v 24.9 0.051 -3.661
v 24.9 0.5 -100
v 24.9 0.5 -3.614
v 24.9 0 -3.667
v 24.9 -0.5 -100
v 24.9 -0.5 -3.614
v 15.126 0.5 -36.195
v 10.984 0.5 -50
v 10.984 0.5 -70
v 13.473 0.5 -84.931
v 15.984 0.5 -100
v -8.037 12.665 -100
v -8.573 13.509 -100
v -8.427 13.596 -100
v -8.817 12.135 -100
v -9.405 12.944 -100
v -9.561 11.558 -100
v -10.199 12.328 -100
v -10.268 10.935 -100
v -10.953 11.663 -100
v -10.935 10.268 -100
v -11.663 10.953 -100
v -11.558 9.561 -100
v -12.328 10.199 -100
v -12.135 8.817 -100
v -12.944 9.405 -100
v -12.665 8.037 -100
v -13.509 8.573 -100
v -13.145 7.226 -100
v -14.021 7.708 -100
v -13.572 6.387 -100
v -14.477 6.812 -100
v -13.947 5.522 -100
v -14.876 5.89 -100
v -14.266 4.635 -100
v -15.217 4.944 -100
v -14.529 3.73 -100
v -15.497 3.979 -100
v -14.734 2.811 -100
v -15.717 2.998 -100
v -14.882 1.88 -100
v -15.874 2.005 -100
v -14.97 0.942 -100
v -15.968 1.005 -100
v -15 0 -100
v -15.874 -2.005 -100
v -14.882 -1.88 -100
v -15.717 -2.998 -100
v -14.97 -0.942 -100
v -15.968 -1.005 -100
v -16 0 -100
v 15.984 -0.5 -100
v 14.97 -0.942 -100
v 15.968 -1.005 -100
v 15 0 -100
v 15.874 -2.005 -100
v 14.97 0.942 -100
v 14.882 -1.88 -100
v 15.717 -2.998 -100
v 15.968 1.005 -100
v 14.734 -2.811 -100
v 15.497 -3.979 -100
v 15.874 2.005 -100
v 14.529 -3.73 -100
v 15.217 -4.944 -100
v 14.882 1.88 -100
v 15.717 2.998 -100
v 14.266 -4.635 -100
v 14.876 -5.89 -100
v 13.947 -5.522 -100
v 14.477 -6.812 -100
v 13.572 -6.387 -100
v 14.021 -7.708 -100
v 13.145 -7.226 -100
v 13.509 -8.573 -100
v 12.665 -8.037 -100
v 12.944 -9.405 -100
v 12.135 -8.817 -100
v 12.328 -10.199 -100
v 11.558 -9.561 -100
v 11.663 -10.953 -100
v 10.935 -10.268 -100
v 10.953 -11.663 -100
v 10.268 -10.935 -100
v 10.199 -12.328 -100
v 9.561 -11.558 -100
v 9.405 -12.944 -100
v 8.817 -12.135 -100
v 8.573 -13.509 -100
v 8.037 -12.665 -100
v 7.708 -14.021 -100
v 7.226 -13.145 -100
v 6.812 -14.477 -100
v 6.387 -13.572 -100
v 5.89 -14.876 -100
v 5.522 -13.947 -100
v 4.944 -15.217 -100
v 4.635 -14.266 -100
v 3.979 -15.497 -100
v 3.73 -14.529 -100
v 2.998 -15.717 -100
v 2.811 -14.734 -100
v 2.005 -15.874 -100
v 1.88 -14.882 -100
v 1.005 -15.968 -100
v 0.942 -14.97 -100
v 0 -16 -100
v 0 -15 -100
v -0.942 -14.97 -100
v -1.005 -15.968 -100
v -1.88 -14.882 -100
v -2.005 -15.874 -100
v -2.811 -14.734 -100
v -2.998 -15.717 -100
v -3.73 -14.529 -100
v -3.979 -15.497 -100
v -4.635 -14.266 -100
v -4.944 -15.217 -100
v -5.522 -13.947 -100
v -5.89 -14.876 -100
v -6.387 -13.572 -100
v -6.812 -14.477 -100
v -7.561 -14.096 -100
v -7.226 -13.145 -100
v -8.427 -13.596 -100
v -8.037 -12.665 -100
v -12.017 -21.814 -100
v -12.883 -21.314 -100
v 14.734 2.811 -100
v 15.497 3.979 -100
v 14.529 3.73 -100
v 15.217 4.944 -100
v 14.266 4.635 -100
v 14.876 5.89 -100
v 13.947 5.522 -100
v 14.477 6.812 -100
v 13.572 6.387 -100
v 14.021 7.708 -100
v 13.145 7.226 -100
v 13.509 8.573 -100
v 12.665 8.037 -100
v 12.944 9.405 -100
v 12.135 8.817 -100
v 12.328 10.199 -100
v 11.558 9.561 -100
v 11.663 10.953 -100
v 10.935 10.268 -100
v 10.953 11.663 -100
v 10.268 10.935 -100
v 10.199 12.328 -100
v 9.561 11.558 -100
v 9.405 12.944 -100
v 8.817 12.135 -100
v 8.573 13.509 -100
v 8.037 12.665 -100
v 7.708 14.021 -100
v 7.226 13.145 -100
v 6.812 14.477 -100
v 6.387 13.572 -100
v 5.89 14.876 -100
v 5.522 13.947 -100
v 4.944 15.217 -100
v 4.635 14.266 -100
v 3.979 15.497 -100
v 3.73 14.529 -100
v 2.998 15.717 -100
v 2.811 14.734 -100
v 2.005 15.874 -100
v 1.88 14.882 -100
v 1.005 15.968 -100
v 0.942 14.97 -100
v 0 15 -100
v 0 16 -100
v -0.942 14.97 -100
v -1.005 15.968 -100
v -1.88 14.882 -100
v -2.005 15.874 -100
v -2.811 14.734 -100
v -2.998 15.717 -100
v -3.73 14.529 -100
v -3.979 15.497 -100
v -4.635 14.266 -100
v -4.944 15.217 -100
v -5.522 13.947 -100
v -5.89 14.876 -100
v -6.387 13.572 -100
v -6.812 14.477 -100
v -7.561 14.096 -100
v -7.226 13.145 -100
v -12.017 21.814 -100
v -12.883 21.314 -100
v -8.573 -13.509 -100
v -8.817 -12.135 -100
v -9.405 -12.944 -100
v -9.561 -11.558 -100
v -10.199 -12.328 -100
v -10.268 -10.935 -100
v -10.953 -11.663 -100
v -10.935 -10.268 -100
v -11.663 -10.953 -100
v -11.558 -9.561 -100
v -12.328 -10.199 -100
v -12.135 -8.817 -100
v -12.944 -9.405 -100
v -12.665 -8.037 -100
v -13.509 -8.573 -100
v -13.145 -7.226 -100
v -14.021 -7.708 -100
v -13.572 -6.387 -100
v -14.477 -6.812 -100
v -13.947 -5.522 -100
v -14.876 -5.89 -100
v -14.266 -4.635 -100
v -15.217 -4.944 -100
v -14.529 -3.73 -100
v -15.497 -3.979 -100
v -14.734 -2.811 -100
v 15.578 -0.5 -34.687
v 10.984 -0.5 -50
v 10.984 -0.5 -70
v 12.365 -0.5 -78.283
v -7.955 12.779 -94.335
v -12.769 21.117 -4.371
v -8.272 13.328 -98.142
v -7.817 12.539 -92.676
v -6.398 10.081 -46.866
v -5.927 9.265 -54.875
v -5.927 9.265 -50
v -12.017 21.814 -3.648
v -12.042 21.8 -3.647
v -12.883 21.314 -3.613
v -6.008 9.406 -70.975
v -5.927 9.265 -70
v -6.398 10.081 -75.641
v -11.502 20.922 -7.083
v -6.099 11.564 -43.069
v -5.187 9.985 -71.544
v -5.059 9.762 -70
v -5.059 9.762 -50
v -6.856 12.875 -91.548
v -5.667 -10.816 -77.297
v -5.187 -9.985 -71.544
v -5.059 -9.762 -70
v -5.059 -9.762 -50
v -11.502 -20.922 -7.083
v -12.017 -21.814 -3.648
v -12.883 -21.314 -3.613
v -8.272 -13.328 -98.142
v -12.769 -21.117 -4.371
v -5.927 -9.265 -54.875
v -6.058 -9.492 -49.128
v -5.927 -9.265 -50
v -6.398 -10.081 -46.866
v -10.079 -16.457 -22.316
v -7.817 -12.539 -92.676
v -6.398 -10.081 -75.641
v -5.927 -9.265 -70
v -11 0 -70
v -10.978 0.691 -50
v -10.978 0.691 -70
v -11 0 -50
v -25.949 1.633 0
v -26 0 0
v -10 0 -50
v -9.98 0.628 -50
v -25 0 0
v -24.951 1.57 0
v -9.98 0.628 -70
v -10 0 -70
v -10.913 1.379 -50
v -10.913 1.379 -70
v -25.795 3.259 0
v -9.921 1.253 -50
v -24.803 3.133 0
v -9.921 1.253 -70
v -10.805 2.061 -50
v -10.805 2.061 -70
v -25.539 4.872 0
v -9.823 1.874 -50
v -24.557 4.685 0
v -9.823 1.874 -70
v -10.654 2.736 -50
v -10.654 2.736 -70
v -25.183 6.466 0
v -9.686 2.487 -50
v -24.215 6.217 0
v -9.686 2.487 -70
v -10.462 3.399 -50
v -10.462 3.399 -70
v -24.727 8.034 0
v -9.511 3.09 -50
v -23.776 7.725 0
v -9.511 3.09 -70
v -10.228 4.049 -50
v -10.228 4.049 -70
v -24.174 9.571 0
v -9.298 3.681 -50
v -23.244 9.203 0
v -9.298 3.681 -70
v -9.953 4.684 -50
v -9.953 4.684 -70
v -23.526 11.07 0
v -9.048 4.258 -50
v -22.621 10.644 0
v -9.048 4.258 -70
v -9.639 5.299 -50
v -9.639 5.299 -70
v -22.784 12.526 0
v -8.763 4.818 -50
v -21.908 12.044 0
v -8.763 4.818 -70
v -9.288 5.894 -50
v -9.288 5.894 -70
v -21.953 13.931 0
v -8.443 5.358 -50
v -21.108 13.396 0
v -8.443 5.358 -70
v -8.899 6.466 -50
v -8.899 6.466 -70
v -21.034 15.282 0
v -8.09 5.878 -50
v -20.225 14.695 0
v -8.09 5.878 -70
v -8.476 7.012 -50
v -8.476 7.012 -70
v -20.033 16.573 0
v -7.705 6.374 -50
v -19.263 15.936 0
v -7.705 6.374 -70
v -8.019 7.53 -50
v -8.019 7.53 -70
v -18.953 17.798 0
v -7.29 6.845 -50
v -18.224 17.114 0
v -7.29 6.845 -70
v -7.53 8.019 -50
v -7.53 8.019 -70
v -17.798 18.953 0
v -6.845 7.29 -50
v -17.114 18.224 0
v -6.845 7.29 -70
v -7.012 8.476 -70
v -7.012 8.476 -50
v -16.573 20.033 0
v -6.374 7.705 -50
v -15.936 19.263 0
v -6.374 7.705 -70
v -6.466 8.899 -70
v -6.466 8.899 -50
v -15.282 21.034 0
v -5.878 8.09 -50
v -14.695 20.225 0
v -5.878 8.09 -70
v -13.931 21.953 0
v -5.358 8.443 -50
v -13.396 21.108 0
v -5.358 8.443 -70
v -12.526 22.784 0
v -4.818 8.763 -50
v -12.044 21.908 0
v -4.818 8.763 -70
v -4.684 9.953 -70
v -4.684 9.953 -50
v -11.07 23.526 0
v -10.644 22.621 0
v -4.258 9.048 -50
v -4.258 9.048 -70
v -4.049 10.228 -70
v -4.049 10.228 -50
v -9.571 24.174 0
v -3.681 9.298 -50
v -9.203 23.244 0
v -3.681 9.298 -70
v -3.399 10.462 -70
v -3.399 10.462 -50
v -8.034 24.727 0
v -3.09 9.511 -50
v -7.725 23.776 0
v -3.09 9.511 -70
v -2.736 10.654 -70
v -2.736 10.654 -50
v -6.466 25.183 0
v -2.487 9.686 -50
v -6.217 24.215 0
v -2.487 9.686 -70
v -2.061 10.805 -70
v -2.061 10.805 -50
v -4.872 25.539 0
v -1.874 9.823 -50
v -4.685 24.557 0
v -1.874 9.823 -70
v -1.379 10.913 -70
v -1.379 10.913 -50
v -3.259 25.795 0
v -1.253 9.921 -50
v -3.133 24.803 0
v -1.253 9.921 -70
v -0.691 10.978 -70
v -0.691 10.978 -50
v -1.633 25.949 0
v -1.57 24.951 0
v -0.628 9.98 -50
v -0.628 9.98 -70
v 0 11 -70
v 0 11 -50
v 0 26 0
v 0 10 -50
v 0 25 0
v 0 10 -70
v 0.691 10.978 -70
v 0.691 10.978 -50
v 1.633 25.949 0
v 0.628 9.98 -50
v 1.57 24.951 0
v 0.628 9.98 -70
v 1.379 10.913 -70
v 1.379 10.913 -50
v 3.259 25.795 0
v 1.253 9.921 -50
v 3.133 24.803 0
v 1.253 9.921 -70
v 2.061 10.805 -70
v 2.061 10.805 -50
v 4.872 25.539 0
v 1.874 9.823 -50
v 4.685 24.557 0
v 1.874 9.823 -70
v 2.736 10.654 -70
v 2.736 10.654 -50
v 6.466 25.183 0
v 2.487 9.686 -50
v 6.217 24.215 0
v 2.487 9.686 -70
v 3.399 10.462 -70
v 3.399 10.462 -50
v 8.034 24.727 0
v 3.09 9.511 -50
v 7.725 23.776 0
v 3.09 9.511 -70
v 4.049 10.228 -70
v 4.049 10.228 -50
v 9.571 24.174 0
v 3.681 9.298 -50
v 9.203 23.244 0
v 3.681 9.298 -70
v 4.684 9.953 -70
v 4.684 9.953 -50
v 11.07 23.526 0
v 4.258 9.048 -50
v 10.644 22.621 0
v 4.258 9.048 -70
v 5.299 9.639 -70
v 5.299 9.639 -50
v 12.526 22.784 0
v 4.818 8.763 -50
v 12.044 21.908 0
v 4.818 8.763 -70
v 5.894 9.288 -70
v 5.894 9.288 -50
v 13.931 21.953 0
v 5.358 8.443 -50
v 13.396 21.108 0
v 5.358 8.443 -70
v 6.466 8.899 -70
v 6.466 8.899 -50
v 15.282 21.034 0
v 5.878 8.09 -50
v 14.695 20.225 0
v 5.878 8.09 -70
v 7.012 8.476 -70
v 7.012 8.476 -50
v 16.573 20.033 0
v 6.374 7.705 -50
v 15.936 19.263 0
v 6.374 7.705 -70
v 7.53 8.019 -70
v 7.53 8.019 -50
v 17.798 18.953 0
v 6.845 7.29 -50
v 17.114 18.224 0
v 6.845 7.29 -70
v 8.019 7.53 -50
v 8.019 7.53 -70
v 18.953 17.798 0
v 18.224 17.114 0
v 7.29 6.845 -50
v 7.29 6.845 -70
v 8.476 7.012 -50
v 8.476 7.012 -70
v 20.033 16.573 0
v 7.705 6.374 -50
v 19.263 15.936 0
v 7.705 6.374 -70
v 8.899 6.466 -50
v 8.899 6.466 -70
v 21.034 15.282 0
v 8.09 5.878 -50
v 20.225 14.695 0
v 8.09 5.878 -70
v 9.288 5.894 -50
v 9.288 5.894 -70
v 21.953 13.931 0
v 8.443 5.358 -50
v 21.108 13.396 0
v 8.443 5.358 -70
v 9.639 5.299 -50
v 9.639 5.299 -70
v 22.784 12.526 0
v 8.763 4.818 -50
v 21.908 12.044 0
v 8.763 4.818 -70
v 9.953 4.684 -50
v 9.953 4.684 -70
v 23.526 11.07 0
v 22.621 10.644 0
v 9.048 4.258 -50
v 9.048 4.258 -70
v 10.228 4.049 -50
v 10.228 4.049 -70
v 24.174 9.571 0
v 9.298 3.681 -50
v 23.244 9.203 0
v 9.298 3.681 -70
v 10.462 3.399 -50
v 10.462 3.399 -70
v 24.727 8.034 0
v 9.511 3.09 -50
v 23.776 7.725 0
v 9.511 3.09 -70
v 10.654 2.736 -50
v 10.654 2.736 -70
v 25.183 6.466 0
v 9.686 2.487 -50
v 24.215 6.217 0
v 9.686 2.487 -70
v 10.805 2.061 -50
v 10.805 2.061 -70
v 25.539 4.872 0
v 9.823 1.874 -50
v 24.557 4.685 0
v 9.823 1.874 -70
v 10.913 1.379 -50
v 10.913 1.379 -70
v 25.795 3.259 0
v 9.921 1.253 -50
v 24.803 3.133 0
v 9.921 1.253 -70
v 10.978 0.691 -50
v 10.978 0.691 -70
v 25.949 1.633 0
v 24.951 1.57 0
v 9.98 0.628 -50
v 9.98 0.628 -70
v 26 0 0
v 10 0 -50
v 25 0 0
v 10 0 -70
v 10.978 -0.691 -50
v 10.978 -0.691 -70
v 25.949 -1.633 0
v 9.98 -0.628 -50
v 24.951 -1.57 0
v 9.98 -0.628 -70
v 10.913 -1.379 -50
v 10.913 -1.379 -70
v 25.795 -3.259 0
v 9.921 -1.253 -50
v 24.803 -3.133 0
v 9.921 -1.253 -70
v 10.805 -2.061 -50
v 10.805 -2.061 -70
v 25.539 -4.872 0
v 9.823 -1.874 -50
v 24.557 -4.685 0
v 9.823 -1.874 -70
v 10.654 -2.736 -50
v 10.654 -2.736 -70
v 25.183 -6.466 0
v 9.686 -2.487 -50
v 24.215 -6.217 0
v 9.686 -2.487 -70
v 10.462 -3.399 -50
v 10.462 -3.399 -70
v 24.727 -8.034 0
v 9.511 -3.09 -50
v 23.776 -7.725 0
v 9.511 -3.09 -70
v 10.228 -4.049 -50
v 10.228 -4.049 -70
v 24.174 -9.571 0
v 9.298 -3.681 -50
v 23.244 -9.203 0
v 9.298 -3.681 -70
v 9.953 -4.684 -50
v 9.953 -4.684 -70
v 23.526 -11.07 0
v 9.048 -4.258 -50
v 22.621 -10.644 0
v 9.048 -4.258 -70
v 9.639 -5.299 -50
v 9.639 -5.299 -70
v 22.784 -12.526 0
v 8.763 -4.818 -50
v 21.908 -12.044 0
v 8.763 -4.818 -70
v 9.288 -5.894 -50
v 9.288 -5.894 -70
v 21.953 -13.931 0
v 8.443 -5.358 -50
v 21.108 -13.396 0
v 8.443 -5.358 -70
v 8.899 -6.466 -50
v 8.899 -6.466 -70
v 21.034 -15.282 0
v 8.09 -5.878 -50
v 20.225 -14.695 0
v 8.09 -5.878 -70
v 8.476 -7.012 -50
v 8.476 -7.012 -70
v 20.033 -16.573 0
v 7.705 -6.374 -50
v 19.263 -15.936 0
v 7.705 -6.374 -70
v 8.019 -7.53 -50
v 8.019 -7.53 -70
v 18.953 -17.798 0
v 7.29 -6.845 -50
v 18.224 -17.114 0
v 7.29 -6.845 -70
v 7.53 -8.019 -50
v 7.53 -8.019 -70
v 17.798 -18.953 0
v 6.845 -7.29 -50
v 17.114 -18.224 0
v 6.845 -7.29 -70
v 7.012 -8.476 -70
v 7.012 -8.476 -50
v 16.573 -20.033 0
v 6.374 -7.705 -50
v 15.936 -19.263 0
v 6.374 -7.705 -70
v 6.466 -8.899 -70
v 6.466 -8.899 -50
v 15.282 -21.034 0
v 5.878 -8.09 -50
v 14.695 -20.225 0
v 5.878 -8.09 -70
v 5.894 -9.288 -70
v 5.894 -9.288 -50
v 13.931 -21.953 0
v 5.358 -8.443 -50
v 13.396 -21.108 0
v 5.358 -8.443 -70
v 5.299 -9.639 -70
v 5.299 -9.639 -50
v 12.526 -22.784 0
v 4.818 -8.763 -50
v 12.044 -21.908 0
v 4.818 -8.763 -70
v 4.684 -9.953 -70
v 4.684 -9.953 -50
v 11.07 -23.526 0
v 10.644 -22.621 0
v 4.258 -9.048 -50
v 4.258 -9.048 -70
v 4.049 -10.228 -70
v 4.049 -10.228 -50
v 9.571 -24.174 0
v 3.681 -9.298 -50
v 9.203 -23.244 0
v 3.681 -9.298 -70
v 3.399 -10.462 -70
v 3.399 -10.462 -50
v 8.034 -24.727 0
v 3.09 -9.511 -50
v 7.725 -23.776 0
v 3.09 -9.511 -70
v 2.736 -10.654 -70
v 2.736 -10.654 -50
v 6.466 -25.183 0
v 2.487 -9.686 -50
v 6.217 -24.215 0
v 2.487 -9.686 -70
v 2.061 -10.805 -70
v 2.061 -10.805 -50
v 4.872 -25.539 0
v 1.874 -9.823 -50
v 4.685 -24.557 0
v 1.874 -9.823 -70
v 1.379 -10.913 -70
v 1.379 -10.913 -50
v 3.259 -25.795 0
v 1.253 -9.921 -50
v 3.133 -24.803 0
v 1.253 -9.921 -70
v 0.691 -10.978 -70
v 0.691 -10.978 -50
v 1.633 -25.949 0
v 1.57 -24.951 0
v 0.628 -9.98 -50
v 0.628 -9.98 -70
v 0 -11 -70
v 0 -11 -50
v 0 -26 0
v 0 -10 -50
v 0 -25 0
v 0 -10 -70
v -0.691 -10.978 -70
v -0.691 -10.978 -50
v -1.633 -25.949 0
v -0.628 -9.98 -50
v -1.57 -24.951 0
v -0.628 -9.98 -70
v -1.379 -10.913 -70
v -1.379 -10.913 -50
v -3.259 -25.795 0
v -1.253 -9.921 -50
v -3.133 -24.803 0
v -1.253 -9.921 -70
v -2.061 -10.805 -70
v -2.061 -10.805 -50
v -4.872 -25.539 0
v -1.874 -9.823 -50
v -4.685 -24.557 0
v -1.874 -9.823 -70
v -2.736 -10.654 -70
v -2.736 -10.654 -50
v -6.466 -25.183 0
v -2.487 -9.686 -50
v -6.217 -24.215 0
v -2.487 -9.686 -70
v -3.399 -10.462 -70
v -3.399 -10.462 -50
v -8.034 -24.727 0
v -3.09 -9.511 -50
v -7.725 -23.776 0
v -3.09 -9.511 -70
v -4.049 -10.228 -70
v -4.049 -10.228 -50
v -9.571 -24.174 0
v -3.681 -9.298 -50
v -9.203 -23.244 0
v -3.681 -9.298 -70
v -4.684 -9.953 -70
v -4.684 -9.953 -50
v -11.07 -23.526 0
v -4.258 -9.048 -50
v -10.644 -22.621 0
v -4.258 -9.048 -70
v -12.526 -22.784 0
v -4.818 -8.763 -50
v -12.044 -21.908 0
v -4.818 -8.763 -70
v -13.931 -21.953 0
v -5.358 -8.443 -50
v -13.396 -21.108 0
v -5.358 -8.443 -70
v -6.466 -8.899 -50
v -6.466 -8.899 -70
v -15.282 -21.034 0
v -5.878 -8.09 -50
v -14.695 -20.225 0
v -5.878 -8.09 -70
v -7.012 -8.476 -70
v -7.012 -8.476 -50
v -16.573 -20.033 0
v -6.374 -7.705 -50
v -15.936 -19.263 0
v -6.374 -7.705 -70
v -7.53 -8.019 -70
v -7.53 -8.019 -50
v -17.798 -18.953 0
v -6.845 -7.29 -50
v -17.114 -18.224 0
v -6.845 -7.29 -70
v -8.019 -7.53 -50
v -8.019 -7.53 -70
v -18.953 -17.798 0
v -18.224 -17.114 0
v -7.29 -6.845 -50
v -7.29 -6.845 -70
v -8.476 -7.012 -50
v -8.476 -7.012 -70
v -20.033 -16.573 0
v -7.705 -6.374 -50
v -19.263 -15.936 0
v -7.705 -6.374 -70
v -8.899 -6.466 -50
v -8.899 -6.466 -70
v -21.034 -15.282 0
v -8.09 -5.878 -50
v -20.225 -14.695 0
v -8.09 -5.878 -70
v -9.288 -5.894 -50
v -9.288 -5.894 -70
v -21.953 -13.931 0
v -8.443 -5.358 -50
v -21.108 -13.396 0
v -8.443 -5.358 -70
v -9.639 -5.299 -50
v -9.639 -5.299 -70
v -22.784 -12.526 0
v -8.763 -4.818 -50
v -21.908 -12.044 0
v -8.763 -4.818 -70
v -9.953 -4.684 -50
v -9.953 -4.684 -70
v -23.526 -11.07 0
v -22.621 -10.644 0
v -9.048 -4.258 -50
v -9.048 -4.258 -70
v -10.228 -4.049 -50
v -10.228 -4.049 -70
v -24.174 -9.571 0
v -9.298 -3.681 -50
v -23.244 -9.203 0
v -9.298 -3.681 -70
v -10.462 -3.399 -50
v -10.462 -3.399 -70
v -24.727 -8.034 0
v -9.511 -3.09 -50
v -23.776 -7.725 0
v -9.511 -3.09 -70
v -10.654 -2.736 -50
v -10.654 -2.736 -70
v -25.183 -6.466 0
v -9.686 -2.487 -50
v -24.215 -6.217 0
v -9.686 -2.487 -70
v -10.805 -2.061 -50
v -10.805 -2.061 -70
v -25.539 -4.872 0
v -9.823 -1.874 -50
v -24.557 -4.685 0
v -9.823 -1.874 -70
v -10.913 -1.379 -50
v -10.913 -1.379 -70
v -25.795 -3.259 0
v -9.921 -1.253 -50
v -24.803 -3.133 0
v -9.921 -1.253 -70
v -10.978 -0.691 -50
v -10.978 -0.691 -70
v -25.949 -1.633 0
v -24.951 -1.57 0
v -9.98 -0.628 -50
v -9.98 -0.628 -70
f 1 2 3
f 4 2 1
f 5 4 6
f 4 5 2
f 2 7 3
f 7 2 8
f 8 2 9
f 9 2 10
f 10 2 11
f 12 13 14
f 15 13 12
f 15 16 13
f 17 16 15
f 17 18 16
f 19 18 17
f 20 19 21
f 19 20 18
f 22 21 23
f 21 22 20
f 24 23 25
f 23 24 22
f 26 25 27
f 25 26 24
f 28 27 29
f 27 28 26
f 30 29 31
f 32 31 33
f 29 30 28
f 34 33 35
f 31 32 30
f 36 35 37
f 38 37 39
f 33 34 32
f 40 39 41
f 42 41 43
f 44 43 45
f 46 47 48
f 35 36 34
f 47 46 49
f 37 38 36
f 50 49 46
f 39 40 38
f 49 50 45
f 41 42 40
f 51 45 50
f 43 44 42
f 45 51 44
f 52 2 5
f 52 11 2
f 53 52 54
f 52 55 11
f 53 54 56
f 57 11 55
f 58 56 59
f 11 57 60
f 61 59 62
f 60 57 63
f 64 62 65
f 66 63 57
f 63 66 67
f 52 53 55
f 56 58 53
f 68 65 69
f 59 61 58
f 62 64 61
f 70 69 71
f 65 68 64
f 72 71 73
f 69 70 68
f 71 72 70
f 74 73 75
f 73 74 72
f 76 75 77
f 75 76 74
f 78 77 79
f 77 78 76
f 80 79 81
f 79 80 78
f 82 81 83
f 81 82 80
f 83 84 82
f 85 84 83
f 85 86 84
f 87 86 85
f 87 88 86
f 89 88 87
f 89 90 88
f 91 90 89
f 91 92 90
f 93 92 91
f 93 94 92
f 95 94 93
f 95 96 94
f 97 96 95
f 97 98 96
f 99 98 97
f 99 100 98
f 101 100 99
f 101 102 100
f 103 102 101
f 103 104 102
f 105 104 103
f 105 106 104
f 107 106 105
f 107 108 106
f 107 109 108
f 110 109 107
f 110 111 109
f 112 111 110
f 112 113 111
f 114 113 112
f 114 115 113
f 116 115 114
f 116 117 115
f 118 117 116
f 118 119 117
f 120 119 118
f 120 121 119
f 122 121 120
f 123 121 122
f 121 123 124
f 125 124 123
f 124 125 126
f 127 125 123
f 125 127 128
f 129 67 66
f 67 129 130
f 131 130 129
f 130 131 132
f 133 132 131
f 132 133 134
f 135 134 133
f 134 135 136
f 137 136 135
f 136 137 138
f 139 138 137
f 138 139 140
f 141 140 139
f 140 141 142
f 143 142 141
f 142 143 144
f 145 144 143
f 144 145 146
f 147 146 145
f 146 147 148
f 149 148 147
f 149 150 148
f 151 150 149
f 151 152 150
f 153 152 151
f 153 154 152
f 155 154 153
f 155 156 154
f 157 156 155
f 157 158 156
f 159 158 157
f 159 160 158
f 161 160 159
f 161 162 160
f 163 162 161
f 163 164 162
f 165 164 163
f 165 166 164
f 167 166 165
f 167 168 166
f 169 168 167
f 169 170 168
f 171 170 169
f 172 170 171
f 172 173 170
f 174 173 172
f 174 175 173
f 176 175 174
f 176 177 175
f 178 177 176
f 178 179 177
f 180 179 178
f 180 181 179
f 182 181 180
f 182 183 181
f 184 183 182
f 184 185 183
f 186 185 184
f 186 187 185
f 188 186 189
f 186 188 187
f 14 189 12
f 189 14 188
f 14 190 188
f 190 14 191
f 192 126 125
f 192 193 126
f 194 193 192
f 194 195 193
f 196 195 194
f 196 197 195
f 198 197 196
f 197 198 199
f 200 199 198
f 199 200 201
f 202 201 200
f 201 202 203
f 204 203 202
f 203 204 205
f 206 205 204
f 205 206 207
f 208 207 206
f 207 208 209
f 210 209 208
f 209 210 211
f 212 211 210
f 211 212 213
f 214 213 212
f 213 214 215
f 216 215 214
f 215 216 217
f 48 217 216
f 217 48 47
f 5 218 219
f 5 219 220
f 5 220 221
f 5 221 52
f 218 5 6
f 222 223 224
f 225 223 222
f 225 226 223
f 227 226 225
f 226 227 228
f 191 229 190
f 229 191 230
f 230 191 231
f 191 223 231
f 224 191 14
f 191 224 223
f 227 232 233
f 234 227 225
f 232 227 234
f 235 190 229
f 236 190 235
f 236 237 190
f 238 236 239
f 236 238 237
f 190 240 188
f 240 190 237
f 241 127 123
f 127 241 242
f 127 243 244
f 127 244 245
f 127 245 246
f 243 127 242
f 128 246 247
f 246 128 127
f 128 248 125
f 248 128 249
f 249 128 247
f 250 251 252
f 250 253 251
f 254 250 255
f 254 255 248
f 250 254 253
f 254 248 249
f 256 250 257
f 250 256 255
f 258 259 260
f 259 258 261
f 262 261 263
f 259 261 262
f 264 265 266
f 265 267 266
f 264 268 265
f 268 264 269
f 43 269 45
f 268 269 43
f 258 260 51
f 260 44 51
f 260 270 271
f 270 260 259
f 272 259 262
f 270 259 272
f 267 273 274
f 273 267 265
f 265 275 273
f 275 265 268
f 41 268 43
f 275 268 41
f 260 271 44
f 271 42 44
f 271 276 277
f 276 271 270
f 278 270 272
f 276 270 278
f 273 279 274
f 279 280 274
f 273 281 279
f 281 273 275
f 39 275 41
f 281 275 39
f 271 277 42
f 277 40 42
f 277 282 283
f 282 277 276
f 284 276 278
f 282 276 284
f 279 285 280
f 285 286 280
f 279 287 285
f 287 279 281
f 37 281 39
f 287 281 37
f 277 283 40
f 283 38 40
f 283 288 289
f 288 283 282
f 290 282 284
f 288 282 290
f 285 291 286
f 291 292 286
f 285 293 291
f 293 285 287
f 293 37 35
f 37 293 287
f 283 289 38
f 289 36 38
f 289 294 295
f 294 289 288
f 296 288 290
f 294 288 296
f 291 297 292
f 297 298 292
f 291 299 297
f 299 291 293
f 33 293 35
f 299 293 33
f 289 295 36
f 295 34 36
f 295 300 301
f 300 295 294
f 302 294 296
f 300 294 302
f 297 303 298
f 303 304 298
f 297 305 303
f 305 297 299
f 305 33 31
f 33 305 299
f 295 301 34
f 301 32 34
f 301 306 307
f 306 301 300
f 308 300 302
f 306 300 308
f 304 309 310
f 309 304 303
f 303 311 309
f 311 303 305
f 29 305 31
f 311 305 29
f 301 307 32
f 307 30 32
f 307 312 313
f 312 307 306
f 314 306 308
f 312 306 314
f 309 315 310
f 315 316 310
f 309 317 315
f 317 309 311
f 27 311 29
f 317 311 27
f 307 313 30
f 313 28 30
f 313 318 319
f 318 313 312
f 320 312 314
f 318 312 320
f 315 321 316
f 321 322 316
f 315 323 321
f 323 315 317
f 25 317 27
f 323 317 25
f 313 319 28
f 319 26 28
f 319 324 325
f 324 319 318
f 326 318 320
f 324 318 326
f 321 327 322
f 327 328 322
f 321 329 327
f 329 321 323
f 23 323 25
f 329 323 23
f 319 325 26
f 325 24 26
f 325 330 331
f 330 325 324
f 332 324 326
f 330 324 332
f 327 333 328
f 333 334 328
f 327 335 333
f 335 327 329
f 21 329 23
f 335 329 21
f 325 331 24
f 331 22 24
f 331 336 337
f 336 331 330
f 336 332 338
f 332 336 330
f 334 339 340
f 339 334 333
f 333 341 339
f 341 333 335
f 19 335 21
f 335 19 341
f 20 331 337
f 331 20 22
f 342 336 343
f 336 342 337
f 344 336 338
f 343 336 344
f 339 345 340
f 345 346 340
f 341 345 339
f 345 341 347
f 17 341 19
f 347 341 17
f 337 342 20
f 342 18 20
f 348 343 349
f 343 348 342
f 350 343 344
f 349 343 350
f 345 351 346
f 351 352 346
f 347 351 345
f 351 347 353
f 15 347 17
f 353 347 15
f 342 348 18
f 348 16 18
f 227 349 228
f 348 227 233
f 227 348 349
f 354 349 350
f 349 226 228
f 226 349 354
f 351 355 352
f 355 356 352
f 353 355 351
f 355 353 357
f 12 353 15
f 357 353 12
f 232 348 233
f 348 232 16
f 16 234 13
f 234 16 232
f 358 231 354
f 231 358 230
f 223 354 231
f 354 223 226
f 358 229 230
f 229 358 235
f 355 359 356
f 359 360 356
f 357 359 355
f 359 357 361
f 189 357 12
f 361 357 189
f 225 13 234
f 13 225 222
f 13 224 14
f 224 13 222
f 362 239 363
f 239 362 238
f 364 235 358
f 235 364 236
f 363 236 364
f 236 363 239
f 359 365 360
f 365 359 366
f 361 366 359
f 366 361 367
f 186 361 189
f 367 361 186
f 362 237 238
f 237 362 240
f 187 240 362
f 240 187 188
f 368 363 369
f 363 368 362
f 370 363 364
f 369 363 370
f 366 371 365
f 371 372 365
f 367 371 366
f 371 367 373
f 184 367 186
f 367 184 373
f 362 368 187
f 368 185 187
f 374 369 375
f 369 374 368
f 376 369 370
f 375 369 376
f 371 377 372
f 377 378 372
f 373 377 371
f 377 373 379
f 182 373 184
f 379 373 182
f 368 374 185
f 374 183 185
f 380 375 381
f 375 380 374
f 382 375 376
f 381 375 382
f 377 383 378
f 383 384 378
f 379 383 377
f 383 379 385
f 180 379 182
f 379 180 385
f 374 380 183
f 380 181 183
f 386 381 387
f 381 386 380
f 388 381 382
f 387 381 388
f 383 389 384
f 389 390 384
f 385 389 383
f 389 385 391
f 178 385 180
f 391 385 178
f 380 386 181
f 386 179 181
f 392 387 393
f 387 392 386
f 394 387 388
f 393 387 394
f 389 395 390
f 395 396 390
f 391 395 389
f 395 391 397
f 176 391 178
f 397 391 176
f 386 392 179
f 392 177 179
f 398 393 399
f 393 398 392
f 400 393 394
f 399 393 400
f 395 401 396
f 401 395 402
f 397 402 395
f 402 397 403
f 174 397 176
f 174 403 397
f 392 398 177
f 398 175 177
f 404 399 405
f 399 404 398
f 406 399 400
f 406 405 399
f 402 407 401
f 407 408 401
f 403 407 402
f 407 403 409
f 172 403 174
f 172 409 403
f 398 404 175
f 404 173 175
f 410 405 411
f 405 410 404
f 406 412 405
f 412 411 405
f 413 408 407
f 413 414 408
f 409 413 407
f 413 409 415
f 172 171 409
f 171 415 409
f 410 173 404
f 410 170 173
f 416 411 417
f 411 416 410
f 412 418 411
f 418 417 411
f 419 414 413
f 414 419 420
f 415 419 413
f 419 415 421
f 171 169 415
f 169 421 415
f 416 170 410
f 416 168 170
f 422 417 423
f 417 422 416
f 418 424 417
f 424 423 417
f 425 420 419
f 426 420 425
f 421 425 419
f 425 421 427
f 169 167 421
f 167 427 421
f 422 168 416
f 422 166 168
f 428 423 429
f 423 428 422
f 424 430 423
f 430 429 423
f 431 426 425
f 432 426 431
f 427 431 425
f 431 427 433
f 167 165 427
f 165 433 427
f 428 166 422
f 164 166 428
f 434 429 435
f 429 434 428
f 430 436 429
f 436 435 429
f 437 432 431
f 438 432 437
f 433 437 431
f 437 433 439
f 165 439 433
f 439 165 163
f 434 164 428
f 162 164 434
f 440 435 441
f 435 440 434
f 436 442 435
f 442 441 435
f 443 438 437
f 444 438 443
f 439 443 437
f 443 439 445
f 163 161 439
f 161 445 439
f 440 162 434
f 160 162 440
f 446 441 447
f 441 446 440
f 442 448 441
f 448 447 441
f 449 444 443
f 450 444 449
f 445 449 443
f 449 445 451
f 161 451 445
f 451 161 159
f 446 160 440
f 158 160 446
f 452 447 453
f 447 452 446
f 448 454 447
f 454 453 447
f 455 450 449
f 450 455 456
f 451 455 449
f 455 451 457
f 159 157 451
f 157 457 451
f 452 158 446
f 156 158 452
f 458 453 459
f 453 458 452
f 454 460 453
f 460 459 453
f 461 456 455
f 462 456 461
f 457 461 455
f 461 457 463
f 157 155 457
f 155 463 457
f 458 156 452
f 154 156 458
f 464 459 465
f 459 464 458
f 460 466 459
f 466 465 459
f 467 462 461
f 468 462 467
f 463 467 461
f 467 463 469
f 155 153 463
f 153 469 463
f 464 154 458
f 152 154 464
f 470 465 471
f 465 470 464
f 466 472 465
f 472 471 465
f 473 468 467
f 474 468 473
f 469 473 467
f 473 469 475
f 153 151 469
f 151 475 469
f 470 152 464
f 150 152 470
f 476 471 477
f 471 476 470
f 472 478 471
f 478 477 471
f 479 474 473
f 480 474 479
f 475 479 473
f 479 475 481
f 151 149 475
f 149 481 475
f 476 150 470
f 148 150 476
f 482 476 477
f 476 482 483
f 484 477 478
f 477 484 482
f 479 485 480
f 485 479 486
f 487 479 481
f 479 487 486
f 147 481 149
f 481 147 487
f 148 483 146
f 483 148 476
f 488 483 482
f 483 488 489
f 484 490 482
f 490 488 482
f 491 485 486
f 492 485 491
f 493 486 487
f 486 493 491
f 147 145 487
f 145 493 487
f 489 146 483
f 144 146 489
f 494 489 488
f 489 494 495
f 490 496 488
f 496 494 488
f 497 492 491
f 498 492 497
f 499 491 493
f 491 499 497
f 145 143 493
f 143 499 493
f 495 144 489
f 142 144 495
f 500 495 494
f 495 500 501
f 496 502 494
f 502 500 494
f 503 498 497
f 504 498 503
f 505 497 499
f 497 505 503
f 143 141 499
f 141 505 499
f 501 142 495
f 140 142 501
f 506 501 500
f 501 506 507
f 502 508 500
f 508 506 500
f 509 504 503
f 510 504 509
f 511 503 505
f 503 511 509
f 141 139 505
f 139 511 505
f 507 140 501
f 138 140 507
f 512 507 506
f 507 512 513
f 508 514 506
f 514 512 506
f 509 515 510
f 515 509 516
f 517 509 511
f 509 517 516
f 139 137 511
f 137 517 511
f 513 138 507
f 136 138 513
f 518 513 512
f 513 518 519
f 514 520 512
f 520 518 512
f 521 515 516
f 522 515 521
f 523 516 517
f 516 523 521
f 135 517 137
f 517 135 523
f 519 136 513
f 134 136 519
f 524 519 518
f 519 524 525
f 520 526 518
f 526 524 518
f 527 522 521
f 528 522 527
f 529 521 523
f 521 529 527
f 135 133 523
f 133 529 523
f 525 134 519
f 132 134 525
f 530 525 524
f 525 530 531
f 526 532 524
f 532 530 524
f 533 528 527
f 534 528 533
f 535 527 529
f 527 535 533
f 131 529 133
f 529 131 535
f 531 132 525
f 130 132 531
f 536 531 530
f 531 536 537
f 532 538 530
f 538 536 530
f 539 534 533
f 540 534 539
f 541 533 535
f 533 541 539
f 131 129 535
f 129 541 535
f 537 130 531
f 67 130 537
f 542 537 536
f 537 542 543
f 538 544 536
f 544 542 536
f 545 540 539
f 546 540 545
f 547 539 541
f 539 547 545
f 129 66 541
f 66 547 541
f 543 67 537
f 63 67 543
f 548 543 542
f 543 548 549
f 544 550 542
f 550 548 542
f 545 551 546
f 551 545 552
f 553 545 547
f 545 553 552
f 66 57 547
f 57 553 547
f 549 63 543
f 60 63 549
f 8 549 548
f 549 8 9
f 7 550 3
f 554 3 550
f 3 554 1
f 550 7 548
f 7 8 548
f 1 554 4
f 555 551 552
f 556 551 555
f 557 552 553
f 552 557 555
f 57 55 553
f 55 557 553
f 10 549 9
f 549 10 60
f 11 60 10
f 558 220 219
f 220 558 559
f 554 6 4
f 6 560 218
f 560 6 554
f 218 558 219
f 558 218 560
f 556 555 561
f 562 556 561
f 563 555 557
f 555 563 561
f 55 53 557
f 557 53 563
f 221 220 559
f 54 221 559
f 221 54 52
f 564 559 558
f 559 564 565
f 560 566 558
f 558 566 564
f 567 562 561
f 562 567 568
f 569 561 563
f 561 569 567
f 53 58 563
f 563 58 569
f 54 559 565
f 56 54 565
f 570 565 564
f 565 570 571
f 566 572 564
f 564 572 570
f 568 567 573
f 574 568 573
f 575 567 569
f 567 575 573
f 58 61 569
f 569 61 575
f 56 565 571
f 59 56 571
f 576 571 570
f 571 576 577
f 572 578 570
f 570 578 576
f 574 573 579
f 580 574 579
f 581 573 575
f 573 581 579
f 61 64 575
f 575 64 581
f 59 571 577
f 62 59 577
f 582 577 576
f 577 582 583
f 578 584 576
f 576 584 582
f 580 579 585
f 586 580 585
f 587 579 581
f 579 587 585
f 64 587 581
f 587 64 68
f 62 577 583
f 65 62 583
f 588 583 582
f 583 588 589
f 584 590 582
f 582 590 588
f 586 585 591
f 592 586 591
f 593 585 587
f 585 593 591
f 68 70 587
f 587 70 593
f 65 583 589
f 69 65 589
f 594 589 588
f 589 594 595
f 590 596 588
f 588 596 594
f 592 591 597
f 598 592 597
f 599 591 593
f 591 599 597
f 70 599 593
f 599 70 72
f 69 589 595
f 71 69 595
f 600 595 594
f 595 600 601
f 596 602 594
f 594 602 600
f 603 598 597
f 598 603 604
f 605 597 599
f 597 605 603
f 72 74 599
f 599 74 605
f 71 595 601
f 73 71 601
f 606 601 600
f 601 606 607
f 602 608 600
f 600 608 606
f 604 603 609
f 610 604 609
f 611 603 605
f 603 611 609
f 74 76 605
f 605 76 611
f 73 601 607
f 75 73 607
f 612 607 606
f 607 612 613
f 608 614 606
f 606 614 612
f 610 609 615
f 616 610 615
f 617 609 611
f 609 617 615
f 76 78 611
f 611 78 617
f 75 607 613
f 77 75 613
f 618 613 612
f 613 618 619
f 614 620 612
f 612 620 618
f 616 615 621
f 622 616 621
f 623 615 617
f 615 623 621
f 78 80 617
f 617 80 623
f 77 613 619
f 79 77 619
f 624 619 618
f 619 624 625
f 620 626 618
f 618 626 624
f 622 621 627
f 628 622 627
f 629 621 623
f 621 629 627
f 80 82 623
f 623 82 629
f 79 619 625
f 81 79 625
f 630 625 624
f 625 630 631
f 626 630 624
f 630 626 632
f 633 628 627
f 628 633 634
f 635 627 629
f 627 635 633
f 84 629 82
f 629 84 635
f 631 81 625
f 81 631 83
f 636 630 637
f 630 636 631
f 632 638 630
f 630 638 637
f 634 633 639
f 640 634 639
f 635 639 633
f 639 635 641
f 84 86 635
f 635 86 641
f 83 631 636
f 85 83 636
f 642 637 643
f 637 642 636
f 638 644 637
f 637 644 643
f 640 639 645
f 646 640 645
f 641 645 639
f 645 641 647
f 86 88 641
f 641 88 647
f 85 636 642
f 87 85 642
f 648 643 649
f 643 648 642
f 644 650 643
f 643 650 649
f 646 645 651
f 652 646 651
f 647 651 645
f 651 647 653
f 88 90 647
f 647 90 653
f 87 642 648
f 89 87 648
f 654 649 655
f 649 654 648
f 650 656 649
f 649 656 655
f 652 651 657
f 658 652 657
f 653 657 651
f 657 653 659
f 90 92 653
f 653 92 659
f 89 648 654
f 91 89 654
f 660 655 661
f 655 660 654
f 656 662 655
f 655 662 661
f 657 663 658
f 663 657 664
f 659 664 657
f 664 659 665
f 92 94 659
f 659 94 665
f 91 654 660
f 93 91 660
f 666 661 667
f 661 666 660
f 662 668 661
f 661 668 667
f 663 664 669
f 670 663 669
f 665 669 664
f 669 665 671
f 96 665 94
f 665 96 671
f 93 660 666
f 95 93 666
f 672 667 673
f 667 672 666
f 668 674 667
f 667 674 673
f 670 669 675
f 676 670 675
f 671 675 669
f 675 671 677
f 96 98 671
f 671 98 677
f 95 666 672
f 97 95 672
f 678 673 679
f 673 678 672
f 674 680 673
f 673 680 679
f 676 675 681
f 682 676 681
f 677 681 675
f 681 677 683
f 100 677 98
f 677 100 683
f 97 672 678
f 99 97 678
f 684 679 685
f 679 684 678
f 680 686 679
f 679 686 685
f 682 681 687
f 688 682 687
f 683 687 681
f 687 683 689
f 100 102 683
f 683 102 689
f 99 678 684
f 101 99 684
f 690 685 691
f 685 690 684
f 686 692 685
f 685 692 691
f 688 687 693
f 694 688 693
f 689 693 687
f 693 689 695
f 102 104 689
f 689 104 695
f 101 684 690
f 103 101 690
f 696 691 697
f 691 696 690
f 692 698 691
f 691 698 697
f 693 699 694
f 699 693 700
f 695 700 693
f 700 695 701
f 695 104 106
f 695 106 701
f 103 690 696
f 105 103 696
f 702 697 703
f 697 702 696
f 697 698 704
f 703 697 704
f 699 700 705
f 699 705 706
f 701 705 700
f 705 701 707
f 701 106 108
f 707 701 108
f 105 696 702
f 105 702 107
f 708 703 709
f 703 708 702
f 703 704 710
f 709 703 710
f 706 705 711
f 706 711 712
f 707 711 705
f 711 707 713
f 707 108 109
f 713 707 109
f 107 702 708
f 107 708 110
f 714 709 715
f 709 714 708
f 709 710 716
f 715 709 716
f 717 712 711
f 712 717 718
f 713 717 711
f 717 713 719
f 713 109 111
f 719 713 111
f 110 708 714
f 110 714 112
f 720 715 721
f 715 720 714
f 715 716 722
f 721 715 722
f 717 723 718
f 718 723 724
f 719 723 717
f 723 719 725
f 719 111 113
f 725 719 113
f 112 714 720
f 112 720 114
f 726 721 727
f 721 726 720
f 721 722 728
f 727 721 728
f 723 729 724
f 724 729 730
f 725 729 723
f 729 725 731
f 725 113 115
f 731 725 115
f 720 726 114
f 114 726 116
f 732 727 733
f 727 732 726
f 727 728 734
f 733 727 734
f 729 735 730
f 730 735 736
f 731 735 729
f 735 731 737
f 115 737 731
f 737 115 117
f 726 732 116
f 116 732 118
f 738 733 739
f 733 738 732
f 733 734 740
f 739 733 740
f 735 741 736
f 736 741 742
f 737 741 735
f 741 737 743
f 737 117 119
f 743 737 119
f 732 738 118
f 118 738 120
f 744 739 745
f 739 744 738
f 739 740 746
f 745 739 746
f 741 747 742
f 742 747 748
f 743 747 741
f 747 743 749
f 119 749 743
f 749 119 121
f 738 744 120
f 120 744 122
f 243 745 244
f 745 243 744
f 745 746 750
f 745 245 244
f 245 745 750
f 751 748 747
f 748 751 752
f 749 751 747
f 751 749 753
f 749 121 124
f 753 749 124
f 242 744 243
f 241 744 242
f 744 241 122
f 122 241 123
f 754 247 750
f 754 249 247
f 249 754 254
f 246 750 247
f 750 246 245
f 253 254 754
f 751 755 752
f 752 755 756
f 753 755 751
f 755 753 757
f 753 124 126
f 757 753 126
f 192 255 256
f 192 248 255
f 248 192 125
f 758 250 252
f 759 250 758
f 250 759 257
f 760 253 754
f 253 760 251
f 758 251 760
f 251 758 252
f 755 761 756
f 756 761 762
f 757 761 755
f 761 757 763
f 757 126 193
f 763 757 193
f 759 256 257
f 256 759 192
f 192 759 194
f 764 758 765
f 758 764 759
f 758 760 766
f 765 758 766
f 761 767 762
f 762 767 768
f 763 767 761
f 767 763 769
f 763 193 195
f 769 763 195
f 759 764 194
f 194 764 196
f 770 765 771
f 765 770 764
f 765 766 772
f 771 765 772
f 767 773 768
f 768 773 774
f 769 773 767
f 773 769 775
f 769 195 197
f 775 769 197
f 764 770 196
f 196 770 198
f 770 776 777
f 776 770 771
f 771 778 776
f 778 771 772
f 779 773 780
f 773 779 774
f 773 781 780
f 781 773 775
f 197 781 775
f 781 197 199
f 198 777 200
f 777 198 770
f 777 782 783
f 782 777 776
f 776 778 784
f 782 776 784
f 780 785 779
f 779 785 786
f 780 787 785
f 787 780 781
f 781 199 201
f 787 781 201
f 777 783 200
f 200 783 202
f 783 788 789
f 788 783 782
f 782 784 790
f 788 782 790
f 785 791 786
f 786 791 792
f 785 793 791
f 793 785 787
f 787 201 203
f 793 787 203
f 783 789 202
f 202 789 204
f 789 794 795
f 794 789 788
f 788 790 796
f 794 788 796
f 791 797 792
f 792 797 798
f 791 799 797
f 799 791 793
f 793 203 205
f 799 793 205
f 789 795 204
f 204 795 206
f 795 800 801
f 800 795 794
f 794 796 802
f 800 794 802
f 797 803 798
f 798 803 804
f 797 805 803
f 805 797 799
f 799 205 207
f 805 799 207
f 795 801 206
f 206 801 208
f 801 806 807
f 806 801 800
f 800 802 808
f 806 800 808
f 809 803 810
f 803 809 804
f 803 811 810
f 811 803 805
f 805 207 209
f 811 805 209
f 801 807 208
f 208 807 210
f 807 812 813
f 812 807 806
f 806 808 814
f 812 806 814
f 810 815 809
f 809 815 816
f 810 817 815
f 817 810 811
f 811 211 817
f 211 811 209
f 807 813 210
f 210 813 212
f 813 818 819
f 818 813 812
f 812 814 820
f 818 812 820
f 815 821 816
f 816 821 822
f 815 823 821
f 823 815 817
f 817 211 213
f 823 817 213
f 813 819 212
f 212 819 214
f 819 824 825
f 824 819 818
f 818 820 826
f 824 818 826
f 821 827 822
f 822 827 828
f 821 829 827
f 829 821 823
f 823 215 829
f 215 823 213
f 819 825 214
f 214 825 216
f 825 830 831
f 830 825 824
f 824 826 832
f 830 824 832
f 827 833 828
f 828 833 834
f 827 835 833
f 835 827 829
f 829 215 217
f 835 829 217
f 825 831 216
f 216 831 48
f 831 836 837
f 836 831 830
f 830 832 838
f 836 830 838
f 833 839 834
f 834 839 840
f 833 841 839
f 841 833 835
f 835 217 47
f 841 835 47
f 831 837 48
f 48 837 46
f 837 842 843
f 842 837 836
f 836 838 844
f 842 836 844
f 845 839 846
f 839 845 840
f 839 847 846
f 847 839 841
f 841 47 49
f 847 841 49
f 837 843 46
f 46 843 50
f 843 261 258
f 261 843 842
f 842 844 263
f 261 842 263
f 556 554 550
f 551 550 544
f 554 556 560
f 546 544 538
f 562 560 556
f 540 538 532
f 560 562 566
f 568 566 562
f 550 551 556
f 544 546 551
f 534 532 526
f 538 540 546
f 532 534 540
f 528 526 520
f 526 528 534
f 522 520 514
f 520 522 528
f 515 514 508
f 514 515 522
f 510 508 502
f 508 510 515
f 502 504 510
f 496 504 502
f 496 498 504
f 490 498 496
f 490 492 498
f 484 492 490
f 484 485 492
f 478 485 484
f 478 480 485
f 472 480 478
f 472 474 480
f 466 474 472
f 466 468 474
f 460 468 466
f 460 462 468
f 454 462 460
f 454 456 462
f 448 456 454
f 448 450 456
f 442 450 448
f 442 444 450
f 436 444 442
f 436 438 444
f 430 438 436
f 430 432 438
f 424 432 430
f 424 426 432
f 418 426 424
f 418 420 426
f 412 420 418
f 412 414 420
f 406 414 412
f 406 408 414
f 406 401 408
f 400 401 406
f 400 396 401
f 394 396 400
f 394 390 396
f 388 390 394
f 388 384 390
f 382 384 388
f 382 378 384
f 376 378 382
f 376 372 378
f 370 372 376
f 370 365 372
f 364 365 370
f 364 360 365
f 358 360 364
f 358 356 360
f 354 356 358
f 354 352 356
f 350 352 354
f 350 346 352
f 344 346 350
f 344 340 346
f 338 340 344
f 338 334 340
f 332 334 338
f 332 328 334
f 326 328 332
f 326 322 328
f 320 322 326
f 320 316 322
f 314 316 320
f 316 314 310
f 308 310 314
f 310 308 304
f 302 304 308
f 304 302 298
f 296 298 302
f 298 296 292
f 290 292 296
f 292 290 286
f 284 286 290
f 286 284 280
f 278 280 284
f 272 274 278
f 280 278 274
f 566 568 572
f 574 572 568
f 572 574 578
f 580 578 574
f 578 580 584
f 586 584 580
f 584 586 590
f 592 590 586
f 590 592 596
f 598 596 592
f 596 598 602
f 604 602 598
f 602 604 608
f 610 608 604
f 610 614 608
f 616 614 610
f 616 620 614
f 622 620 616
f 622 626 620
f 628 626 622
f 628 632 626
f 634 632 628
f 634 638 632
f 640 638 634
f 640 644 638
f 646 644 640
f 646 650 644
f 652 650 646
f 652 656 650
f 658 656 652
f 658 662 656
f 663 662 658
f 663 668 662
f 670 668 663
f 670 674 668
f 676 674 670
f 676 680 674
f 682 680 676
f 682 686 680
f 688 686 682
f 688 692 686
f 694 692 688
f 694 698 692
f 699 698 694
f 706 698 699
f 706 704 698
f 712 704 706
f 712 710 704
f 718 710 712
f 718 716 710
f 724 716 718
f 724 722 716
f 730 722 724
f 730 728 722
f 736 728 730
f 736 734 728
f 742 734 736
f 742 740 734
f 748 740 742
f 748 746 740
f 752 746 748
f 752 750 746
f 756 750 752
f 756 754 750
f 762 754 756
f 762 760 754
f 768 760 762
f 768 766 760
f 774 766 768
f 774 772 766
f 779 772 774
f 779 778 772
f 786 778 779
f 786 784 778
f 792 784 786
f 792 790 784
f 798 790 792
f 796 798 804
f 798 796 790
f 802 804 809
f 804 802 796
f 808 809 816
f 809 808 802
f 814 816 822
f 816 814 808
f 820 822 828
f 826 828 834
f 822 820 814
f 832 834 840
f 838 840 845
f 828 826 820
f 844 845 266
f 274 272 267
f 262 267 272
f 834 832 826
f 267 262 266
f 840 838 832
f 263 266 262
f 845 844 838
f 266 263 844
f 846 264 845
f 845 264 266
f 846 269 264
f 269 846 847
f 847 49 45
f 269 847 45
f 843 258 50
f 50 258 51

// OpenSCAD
  // Venturi tube profiles, and handling info.

// All tube profiles should have a flat surface at z=0, and have all material below xy plane.

/* --Linear Tube profile-- */

function vp_lt_params(
    inlet_length=50,
    inlet_diameter=50,
    throat_length=20,
    throat_diameter=20,
    outlet_length=30,
    outlet_diameter=30,
) = [
     inlet_length,  inlet_diameter,
     throat_length, throat_diameter,
     outlet_length, outlet_diameter
    ];


module vp_lt_body(
    vplt_p,
    wall_thickness = 1
){
    // So I can use identifiers for vplt_p.
    // Will be in most linear tube profile modules.
    let(
        il = 0,
        id = 1,
        tl = 2,
        td = 3,
        ol = 4,
        od = 5
    ){
        inlet_st  = [vplt_p[id]/2,0];
        throat_st = [vplt_p[td]/2,-vplt_p[il]];
        throat_ed = throat_st - [0,vplt_p[tl]];
        outlet_ed = [vplt_p[od]/2,throat_ed.y-vplt_p[ol]];
        
        pt = [inlet_st,throat_st,throat_ed,outlet_ed];
        vertexes = concat(pt,
        [for (i = [len(pt)-1:-1:0])pt[i]+[wall_thickness,0]]);
        polygon(vertexes);
    }
}

module vp_lt_silhouette(
    vplt_p,
    wall_thickness = 1,
){
    let(
        il = 0,
        id = 1,
        tl = 2,
        td = 3,
        ol = 4,
        od = 5
    ){
        inlet_st  = [vplt_p[id]/2,0];
        throat_st = [vplt_p[td]/2,-vplt_p[il]];
        throat_ed = throat_st - [0,vplt_p[tl]];
        outlet_ed = [vplt_p[od]/2,throat_ed.y-vplt_p[ol]];
     
        pt = [inlet_st,throat_st,throat_ed,outlet_ed];
        // Above was copied and pasted from vp_lt_body
        
        vertexes = [for (i=[0:len(pt)-1])pt[i]+
                     [wall_thickness/2,0],
                   [0,outlet_ed.y],
                   [0,0]];
        polygon(vertexes);
    }
}

/* --Linear Tube profile end-- */

// Child should be a silhouette
// undersize is in the form[+x,-x,+y,-y]
module vp_support(
    radius = 25,
    length = 100,
    thickness = 1,
    number = 3,
    undersize = [.1,.1,.1,.1]
){
    trans = [undersize[1],undersize[3]];
    size  = [undersize[0]+undersize[1],
             undersize[2]+undersize[3]];
    

    for(i = [0:360/number:360-360/number]){
        rotate([90,0,i])
        linear_extrude(height=thickness,center=true)
        difference(){
            translate([0,-100]+trans)
            square([radius,length]-size);
            
            children();
        }
    }
}



    
vplt_p = vp_lt_params();
union(){
    rotate_extrude($fn=100)
    vp_lt_body(vplt_p); 

    vp_support(undersize=[.1,.1,.1,0])
    vp_lt_silhouette(vplt_p);
}
